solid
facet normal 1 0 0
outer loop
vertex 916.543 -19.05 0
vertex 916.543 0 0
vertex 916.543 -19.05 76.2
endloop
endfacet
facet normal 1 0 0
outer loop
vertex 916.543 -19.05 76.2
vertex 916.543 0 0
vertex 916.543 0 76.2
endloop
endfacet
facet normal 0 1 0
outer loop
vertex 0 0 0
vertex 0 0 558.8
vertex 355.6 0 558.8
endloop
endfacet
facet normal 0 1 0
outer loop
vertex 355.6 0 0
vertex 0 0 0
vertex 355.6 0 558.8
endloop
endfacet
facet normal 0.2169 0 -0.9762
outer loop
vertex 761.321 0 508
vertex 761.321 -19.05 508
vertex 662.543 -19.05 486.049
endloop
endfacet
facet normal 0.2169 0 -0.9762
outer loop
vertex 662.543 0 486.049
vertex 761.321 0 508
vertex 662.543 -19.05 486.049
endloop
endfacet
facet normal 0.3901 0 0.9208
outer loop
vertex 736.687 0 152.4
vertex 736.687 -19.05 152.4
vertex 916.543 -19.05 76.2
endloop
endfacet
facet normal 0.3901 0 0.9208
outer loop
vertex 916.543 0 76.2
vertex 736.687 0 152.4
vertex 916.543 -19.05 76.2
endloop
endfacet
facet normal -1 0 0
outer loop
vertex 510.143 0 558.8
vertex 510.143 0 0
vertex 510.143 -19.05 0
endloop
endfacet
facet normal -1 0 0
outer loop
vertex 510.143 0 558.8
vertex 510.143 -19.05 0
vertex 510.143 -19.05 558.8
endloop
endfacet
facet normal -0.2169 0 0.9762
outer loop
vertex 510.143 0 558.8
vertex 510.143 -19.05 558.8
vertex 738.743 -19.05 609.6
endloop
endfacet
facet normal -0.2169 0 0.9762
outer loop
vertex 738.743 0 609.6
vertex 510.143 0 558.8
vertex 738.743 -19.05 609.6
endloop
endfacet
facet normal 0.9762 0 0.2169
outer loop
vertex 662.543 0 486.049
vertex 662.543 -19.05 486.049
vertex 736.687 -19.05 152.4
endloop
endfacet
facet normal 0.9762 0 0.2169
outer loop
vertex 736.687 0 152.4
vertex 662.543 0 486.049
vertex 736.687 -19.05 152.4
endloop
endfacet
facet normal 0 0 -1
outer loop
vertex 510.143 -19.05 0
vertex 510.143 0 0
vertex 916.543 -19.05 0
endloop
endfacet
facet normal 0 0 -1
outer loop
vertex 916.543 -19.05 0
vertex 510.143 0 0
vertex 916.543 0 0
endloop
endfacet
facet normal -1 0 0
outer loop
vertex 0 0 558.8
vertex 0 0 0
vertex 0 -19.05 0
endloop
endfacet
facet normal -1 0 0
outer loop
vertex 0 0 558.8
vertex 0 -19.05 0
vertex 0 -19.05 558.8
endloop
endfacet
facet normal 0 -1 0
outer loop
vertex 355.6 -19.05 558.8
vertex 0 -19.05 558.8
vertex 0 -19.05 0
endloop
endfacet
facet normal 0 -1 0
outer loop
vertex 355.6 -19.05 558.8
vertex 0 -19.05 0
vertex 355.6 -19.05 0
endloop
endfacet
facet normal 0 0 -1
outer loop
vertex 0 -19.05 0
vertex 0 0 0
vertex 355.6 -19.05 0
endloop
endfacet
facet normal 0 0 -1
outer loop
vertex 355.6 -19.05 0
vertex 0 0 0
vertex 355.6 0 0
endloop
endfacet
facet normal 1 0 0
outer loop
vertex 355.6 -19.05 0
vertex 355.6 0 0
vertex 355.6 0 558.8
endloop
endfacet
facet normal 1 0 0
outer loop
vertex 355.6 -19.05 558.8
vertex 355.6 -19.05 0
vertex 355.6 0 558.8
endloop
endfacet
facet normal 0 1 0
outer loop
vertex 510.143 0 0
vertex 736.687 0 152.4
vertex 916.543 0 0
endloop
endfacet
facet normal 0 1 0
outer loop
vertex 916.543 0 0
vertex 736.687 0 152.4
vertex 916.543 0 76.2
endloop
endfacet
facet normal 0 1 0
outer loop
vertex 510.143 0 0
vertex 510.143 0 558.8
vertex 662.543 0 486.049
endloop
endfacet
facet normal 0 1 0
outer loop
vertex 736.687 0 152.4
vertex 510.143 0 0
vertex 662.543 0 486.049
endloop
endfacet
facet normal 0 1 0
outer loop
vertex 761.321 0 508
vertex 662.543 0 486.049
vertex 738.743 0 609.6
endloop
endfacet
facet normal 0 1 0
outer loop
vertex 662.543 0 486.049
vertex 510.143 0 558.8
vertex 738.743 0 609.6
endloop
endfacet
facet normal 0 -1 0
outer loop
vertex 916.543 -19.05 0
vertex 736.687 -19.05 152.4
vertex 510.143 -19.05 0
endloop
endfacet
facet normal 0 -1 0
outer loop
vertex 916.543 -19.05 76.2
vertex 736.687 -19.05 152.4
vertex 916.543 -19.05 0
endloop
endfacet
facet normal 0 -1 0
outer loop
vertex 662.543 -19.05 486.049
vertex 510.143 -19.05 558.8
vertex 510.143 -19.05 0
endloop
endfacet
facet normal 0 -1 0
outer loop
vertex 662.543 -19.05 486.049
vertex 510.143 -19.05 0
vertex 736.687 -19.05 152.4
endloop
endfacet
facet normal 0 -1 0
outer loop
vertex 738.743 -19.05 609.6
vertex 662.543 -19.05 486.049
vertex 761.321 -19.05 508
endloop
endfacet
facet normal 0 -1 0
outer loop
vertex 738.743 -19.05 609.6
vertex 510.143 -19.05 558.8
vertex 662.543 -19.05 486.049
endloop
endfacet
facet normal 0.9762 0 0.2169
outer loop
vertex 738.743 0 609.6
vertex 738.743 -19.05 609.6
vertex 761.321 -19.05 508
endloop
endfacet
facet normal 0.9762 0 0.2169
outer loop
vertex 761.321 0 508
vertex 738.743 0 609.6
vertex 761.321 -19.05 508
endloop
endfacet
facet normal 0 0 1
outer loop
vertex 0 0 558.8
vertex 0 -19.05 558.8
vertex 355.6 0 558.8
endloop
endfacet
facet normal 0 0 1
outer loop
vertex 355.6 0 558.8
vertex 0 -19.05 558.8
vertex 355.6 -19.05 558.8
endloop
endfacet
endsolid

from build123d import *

# Parameters (mm, degrees)
F0_W     = 355.6
F0_H     = 609.6
F1_DEPTH = 19.05
F2_W     = 406.4
F2_H     = 609.6
F3_DEPTH = 19.05
F5_DEPTH = 19.051
F6_W     = 355.6
F6_H     = 50.8
F7_DEPTH = 19.051


with BuildPart() as f1:
    # F0 (on Front) → F1 (new body)
    with BuildSketch(Plane.XZ):
        with Locations((177.8, 304.8)):
            Rectangle(F0_W, F0_H)
    extrude(amount=F1_DEPTH)

    # F6 (on face) → F7 (cut, through all)
    with BuildSketch(Plane.XZ.offset(19.05)):
        with Locations((177.8, 584.2)):
            Rectangle(F6_W, F6_H)
    extrude(amount=-F7_DEPTH, mode=Mode.SUBTRACT)


with BuildPart() as f3:
    # F2 (on Front) → F3 (new body)
    with BuildSketch(Plane.XZ):
        with Locations((713.342863, 304.8)):
            Rectangle(F2_W, F2_H)
    extrude(amount=F3_DEPTH)

    # F4 (on face) → F5 (cut, through all)
    with BuildSketch(Plane.XZ.offset(19.05)):
        Polygon((916.542863, 609.6), (738.742863, 609.6), (761.320641, 508), (662.542863, 486.049383), (736.68717, 152.4), (916.542863, 76.2), align=None)
        Polygon((510.142863, 558.8), (738.742863, 609.6), (510.142863, 609.6), align=None)
    extrude(amount=-F5_DEPTH, mode=Mode.SUBTRACT)


solid = Compound([f1.part, f3.part])
